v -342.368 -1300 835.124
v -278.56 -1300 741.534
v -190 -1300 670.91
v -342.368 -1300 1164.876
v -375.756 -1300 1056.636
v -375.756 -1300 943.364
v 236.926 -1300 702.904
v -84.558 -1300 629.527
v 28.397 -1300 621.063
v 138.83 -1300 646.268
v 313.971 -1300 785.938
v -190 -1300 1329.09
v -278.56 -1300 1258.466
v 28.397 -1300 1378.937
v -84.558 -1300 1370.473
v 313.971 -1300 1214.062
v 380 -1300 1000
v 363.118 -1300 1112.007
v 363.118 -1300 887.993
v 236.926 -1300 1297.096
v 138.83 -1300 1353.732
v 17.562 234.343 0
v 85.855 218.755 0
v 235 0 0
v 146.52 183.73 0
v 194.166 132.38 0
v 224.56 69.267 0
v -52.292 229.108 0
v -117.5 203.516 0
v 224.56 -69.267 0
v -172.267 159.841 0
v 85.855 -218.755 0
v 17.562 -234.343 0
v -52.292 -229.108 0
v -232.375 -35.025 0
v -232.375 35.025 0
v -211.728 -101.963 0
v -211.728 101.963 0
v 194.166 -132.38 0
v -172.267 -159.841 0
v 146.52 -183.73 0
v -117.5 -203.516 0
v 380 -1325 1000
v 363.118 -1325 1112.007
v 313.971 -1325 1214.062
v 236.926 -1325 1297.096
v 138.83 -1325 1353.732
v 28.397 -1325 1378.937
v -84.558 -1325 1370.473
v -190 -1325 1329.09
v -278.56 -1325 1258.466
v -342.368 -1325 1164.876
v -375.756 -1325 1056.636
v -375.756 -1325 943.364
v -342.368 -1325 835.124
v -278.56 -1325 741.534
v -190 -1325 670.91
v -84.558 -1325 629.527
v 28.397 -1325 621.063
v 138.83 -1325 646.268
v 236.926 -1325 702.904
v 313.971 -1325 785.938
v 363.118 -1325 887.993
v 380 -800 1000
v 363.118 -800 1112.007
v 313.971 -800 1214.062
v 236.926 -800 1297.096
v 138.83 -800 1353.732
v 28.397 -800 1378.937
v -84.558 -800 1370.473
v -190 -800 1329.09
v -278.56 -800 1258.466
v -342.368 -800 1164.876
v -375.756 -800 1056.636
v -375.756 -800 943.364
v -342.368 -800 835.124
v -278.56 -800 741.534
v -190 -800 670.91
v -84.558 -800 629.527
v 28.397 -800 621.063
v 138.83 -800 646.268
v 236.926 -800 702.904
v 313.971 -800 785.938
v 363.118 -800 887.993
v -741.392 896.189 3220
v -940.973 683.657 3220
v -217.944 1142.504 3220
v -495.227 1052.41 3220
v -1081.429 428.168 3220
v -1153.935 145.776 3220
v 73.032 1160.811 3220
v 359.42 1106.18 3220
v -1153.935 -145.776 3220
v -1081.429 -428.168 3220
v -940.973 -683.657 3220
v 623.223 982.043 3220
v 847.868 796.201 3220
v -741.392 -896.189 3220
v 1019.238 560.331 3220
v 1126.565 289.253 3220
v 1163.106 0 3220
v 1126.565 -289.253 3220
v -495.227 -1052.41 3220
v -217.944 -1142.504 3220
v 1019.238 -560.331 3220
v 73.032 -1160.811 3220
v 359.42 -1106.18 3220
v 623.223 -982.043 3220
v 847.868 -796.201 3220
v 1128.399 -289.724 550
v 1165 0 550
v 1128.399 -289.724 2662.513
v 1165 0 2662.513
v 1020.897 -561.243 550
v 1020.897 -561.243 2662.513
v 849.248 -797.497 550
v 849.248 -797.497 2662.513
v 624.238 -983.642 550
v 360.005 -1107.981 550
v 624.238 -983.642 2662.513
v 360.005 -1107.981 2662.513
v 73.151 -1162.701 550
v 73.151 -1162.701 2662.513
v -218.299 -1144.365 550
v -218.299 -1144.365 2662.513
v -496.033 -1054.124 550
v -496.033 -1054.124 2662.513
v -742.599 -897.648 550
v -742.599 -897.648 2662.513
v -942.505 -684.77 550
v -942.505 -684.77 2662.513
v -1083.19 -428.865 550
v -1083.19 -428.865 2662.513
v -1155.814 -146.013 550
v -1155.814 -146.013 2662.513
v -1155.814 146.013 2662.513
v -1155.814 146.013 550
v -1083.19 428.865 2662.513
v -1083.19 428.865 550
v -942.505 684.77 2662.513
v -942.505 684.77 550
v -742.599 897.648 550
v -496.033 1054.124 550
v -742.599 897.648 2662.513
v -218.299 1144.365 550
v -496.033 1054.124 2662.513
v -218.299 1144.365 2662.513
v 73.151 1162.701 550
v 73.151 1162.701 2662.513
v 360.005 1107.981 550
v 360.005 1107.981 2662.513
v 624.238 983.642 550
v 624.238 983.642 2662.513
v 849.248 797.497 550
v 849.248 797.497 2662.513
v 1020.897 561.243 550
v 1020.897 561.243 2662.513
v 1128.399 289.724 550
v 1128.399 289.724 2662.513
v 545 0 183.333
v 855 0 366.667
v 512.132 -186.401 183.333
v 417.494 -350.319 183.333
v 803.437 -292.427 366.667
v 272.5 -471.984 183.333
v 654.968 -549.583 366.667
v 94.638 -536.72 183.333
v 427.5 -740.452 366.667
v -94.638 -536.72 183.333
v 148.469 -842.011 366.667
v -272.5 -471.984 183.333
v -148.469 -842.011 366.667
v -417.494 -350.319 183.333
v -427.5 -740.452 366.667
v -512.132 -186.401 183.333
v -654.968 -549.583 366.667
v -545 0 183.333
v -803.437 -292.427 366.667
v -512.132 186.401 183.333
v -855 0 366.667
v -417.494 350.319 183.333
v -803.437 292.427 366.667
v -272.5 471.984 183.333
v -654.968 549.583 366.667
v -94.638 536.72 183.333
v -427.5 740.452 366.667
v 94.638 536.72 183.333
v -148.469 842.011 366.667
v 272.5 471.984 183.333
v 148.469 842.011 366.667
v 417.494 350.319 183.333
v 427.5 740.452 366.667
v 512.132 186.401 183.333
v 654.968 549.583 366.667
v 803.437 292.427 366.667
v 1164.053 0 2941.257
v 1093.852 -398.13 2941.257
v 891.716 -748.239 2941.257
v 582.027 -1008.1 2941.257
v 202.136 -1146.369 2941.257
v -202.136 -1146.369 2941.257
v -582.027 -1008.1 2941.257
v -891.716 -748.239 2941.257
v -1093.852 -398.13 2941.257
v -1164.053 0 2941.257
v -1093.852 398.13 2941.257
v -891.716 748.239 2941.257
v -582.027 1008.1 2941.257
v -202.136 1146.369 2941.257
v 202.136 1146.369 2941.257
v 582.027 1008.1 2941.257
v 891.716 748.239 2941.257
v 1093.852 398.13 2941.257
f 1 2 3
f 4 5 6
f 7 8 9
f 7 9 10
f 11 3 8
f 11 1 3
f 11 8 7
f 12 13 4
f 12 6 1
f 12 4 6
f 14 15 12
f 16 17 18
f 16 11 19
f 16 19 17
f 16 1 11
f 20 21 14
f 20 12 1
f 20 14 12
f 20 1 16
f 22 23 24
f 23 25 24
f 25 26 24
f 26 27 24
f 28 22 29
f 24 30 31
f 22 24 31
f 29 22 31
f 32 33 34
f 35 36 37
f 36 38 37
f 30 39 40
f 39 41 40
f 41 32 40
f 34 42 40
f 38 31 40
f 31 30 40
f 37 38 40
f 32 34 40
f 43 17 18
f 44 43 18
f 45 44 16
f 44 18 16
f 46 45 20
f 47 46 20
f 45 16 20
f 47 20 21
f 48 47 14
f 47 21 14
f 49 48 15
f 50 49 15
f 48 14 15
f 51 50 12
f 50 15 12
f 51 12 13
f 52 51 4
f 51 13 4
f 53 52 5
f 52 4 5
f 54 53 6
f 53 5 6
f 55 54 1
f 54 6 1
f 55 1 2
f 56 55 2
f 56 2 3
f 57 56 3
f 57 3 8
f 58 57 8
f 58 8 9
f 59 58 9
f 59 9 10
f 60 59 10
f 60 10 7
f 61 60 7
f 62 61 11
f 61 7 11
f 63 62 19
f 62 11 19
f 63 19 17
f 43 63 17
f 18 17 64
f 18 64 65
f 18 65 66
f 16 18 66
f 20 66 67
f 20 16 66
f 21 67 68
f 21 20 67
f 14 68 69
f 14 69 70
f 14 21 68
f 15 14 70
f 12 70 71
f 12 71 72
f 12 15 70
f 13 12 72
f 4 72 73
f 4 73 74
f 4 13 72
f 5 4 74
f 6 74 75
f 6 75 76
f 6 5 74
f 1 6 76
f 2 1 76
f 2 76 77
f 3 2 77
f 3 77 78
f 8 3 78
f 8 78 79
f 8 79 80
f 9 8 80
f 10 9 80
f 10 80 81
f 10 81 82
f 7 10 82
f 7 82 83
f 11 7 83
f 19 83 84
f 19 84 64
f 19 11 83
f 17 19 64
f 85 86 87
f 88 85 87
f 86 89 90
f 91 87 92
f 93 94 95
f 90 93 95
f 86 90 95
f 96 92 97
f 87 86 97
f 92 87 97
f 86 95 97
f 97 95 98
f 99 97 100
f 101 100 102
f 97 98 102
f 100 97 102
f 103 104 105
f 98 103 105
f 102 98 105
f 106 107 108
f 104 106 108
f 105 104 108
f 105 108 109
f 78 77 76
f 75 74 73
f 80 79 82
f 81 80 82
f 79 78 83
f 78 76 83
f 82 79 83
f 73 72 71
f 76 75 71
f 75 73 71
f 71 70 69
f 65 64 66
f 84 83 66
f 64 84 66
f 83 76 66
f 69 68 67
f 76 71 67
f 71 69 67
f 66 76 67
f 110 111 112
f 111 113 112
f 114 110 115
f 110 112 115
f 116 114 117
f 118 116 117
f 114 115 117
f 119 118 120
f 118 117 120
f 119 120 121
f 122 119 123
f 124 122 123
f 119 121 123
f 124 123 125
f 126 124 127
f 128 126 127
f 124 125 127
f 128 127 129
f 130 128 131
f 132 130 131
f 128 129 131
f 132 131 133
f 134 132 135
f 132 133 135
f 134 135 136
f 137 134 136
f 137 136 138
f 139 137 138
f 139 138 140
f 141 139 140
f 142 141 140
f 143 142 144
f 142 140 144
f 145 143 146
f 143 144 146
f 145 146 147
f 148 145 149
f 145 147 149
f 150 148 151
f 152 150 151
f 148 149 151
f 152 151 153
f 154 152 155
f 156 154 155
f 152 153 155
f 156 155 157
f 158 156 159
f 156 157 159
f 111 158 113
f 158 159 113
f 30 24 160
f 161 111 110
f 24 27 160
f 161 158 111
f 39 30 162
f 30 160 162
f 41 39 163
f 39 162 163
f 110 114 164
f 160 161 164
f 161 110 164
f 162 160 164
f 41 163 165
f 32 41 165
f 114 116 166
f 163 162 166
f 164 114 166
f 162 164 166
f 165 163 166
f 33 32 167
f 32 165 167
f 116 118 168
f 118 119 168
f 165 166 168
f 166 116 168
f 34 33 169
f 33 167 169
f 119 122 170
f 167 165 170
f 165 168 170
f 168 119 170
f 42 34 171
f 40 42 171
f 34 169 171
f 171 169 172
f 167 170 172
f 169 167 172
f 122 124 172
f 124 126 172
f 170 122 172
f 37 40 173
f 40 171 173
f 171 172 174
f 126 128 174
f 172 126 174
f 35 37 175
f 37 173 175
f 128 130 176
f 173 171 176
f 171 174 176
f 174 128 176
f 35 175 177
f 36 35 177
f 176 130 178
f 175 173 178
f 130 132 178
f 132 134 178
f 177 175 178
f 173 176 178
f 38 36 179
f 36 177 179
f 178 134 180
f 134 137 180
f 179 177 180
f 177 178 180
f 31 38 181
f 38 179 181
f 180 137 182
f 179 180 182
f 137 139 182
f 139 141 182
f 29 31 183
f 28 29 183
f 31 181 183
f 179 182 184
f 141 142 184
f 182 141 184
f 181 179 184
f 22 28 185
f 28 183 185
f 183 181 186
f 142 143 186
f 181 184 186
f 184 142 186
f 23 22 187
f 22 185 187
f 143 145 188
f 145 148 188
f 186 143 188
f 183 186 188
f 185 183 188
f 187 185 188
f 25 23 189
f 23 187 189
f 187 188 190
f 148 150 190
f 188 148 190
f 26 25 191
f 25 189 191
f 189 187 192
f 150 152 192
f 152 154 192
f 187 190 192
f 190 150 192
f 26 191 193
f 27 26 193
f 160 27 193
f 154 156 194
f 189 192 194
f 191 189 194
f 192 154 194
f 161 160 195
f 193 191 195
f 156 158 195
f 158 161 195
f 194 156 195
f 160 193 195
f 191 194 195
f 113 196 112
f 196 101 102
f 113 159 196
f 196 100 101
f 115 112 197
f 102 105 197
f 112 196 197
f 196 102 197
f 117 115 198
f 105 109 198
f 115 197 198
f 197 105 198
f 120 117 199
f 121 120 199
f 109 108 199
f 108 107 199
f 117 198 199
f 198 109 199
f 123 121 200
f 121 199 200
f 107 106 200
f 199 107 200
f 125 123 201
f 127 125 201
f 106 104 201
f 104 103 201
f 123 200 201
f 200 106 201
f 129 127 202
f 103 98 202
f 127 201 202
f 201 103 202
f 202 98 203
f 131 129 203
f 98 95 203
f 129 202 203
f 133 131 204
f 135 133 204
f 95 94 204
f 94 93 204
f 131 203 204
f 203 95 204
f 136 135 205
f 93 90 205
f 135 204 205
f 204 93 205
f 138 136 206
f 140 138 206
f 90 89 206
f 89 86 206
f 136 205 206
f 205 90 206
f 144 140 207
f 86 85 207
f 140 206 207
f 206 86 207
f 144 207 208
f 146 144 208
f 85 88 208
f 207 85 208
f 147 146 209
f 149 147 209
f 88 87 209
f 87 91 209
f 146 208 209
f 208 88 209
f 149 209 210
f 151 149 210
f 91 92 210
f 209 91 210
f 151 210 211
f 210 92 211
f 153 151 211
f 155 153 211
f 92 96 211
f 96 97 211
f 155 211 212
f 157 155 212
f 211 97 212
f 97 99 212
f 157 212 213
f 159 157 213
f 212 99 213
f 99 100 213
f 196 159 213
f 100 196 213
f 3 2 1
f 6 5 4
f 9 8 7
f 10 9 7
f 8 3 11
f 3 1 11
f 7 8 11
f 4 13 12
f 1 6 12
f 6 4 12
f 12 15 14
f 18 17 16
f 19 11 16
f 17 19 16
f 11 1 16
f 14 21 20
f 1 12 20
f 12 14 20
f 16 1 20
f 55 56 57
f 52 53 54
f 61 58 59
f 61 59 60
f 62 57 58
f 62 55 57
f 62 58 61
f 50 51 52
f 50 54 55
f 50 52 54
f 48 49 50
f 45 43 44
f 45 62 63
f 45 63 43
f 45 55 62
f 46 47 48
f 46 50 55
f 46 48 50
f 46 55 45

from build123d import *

# Parameters (mm, degrees)
F3_R     = 380
F4_DEPTH = 25
F5_DEPTH = 500


with BuildPart() as f1:
    # F0 (on Front) → F1 (revolve)
    with BuildSketch(Plane.XZ):
        Polygon((0, 3220), (0, 0), (235, 0), (1165, 550), (1165, 2662.513172), (1163.106203, 3220), align=None)
    revolve(axis=Axis((0, 0, 1610), (0, 0, -1)))


with BuildPart() as f4:
    # F3 (on offset) → F4 (new body)
    with BuildSketch(Plane.XZ.offset(1300)):
        with Locations((0, 1000)):
            Circle(F3_R)
    extrude(amount=F4_DEPTH)


with BuildPart() as f5:
    # F3 (on offset) → F5 (new body)
    with BuildSketch(Plane.XZ.offset(1300)):
        with Locations((0, 1000)):
            Circle(F3_R)
    extrude(amount=-F5_DEPTH)


solid = Compound([f1.part, f4.part, f5.part])
